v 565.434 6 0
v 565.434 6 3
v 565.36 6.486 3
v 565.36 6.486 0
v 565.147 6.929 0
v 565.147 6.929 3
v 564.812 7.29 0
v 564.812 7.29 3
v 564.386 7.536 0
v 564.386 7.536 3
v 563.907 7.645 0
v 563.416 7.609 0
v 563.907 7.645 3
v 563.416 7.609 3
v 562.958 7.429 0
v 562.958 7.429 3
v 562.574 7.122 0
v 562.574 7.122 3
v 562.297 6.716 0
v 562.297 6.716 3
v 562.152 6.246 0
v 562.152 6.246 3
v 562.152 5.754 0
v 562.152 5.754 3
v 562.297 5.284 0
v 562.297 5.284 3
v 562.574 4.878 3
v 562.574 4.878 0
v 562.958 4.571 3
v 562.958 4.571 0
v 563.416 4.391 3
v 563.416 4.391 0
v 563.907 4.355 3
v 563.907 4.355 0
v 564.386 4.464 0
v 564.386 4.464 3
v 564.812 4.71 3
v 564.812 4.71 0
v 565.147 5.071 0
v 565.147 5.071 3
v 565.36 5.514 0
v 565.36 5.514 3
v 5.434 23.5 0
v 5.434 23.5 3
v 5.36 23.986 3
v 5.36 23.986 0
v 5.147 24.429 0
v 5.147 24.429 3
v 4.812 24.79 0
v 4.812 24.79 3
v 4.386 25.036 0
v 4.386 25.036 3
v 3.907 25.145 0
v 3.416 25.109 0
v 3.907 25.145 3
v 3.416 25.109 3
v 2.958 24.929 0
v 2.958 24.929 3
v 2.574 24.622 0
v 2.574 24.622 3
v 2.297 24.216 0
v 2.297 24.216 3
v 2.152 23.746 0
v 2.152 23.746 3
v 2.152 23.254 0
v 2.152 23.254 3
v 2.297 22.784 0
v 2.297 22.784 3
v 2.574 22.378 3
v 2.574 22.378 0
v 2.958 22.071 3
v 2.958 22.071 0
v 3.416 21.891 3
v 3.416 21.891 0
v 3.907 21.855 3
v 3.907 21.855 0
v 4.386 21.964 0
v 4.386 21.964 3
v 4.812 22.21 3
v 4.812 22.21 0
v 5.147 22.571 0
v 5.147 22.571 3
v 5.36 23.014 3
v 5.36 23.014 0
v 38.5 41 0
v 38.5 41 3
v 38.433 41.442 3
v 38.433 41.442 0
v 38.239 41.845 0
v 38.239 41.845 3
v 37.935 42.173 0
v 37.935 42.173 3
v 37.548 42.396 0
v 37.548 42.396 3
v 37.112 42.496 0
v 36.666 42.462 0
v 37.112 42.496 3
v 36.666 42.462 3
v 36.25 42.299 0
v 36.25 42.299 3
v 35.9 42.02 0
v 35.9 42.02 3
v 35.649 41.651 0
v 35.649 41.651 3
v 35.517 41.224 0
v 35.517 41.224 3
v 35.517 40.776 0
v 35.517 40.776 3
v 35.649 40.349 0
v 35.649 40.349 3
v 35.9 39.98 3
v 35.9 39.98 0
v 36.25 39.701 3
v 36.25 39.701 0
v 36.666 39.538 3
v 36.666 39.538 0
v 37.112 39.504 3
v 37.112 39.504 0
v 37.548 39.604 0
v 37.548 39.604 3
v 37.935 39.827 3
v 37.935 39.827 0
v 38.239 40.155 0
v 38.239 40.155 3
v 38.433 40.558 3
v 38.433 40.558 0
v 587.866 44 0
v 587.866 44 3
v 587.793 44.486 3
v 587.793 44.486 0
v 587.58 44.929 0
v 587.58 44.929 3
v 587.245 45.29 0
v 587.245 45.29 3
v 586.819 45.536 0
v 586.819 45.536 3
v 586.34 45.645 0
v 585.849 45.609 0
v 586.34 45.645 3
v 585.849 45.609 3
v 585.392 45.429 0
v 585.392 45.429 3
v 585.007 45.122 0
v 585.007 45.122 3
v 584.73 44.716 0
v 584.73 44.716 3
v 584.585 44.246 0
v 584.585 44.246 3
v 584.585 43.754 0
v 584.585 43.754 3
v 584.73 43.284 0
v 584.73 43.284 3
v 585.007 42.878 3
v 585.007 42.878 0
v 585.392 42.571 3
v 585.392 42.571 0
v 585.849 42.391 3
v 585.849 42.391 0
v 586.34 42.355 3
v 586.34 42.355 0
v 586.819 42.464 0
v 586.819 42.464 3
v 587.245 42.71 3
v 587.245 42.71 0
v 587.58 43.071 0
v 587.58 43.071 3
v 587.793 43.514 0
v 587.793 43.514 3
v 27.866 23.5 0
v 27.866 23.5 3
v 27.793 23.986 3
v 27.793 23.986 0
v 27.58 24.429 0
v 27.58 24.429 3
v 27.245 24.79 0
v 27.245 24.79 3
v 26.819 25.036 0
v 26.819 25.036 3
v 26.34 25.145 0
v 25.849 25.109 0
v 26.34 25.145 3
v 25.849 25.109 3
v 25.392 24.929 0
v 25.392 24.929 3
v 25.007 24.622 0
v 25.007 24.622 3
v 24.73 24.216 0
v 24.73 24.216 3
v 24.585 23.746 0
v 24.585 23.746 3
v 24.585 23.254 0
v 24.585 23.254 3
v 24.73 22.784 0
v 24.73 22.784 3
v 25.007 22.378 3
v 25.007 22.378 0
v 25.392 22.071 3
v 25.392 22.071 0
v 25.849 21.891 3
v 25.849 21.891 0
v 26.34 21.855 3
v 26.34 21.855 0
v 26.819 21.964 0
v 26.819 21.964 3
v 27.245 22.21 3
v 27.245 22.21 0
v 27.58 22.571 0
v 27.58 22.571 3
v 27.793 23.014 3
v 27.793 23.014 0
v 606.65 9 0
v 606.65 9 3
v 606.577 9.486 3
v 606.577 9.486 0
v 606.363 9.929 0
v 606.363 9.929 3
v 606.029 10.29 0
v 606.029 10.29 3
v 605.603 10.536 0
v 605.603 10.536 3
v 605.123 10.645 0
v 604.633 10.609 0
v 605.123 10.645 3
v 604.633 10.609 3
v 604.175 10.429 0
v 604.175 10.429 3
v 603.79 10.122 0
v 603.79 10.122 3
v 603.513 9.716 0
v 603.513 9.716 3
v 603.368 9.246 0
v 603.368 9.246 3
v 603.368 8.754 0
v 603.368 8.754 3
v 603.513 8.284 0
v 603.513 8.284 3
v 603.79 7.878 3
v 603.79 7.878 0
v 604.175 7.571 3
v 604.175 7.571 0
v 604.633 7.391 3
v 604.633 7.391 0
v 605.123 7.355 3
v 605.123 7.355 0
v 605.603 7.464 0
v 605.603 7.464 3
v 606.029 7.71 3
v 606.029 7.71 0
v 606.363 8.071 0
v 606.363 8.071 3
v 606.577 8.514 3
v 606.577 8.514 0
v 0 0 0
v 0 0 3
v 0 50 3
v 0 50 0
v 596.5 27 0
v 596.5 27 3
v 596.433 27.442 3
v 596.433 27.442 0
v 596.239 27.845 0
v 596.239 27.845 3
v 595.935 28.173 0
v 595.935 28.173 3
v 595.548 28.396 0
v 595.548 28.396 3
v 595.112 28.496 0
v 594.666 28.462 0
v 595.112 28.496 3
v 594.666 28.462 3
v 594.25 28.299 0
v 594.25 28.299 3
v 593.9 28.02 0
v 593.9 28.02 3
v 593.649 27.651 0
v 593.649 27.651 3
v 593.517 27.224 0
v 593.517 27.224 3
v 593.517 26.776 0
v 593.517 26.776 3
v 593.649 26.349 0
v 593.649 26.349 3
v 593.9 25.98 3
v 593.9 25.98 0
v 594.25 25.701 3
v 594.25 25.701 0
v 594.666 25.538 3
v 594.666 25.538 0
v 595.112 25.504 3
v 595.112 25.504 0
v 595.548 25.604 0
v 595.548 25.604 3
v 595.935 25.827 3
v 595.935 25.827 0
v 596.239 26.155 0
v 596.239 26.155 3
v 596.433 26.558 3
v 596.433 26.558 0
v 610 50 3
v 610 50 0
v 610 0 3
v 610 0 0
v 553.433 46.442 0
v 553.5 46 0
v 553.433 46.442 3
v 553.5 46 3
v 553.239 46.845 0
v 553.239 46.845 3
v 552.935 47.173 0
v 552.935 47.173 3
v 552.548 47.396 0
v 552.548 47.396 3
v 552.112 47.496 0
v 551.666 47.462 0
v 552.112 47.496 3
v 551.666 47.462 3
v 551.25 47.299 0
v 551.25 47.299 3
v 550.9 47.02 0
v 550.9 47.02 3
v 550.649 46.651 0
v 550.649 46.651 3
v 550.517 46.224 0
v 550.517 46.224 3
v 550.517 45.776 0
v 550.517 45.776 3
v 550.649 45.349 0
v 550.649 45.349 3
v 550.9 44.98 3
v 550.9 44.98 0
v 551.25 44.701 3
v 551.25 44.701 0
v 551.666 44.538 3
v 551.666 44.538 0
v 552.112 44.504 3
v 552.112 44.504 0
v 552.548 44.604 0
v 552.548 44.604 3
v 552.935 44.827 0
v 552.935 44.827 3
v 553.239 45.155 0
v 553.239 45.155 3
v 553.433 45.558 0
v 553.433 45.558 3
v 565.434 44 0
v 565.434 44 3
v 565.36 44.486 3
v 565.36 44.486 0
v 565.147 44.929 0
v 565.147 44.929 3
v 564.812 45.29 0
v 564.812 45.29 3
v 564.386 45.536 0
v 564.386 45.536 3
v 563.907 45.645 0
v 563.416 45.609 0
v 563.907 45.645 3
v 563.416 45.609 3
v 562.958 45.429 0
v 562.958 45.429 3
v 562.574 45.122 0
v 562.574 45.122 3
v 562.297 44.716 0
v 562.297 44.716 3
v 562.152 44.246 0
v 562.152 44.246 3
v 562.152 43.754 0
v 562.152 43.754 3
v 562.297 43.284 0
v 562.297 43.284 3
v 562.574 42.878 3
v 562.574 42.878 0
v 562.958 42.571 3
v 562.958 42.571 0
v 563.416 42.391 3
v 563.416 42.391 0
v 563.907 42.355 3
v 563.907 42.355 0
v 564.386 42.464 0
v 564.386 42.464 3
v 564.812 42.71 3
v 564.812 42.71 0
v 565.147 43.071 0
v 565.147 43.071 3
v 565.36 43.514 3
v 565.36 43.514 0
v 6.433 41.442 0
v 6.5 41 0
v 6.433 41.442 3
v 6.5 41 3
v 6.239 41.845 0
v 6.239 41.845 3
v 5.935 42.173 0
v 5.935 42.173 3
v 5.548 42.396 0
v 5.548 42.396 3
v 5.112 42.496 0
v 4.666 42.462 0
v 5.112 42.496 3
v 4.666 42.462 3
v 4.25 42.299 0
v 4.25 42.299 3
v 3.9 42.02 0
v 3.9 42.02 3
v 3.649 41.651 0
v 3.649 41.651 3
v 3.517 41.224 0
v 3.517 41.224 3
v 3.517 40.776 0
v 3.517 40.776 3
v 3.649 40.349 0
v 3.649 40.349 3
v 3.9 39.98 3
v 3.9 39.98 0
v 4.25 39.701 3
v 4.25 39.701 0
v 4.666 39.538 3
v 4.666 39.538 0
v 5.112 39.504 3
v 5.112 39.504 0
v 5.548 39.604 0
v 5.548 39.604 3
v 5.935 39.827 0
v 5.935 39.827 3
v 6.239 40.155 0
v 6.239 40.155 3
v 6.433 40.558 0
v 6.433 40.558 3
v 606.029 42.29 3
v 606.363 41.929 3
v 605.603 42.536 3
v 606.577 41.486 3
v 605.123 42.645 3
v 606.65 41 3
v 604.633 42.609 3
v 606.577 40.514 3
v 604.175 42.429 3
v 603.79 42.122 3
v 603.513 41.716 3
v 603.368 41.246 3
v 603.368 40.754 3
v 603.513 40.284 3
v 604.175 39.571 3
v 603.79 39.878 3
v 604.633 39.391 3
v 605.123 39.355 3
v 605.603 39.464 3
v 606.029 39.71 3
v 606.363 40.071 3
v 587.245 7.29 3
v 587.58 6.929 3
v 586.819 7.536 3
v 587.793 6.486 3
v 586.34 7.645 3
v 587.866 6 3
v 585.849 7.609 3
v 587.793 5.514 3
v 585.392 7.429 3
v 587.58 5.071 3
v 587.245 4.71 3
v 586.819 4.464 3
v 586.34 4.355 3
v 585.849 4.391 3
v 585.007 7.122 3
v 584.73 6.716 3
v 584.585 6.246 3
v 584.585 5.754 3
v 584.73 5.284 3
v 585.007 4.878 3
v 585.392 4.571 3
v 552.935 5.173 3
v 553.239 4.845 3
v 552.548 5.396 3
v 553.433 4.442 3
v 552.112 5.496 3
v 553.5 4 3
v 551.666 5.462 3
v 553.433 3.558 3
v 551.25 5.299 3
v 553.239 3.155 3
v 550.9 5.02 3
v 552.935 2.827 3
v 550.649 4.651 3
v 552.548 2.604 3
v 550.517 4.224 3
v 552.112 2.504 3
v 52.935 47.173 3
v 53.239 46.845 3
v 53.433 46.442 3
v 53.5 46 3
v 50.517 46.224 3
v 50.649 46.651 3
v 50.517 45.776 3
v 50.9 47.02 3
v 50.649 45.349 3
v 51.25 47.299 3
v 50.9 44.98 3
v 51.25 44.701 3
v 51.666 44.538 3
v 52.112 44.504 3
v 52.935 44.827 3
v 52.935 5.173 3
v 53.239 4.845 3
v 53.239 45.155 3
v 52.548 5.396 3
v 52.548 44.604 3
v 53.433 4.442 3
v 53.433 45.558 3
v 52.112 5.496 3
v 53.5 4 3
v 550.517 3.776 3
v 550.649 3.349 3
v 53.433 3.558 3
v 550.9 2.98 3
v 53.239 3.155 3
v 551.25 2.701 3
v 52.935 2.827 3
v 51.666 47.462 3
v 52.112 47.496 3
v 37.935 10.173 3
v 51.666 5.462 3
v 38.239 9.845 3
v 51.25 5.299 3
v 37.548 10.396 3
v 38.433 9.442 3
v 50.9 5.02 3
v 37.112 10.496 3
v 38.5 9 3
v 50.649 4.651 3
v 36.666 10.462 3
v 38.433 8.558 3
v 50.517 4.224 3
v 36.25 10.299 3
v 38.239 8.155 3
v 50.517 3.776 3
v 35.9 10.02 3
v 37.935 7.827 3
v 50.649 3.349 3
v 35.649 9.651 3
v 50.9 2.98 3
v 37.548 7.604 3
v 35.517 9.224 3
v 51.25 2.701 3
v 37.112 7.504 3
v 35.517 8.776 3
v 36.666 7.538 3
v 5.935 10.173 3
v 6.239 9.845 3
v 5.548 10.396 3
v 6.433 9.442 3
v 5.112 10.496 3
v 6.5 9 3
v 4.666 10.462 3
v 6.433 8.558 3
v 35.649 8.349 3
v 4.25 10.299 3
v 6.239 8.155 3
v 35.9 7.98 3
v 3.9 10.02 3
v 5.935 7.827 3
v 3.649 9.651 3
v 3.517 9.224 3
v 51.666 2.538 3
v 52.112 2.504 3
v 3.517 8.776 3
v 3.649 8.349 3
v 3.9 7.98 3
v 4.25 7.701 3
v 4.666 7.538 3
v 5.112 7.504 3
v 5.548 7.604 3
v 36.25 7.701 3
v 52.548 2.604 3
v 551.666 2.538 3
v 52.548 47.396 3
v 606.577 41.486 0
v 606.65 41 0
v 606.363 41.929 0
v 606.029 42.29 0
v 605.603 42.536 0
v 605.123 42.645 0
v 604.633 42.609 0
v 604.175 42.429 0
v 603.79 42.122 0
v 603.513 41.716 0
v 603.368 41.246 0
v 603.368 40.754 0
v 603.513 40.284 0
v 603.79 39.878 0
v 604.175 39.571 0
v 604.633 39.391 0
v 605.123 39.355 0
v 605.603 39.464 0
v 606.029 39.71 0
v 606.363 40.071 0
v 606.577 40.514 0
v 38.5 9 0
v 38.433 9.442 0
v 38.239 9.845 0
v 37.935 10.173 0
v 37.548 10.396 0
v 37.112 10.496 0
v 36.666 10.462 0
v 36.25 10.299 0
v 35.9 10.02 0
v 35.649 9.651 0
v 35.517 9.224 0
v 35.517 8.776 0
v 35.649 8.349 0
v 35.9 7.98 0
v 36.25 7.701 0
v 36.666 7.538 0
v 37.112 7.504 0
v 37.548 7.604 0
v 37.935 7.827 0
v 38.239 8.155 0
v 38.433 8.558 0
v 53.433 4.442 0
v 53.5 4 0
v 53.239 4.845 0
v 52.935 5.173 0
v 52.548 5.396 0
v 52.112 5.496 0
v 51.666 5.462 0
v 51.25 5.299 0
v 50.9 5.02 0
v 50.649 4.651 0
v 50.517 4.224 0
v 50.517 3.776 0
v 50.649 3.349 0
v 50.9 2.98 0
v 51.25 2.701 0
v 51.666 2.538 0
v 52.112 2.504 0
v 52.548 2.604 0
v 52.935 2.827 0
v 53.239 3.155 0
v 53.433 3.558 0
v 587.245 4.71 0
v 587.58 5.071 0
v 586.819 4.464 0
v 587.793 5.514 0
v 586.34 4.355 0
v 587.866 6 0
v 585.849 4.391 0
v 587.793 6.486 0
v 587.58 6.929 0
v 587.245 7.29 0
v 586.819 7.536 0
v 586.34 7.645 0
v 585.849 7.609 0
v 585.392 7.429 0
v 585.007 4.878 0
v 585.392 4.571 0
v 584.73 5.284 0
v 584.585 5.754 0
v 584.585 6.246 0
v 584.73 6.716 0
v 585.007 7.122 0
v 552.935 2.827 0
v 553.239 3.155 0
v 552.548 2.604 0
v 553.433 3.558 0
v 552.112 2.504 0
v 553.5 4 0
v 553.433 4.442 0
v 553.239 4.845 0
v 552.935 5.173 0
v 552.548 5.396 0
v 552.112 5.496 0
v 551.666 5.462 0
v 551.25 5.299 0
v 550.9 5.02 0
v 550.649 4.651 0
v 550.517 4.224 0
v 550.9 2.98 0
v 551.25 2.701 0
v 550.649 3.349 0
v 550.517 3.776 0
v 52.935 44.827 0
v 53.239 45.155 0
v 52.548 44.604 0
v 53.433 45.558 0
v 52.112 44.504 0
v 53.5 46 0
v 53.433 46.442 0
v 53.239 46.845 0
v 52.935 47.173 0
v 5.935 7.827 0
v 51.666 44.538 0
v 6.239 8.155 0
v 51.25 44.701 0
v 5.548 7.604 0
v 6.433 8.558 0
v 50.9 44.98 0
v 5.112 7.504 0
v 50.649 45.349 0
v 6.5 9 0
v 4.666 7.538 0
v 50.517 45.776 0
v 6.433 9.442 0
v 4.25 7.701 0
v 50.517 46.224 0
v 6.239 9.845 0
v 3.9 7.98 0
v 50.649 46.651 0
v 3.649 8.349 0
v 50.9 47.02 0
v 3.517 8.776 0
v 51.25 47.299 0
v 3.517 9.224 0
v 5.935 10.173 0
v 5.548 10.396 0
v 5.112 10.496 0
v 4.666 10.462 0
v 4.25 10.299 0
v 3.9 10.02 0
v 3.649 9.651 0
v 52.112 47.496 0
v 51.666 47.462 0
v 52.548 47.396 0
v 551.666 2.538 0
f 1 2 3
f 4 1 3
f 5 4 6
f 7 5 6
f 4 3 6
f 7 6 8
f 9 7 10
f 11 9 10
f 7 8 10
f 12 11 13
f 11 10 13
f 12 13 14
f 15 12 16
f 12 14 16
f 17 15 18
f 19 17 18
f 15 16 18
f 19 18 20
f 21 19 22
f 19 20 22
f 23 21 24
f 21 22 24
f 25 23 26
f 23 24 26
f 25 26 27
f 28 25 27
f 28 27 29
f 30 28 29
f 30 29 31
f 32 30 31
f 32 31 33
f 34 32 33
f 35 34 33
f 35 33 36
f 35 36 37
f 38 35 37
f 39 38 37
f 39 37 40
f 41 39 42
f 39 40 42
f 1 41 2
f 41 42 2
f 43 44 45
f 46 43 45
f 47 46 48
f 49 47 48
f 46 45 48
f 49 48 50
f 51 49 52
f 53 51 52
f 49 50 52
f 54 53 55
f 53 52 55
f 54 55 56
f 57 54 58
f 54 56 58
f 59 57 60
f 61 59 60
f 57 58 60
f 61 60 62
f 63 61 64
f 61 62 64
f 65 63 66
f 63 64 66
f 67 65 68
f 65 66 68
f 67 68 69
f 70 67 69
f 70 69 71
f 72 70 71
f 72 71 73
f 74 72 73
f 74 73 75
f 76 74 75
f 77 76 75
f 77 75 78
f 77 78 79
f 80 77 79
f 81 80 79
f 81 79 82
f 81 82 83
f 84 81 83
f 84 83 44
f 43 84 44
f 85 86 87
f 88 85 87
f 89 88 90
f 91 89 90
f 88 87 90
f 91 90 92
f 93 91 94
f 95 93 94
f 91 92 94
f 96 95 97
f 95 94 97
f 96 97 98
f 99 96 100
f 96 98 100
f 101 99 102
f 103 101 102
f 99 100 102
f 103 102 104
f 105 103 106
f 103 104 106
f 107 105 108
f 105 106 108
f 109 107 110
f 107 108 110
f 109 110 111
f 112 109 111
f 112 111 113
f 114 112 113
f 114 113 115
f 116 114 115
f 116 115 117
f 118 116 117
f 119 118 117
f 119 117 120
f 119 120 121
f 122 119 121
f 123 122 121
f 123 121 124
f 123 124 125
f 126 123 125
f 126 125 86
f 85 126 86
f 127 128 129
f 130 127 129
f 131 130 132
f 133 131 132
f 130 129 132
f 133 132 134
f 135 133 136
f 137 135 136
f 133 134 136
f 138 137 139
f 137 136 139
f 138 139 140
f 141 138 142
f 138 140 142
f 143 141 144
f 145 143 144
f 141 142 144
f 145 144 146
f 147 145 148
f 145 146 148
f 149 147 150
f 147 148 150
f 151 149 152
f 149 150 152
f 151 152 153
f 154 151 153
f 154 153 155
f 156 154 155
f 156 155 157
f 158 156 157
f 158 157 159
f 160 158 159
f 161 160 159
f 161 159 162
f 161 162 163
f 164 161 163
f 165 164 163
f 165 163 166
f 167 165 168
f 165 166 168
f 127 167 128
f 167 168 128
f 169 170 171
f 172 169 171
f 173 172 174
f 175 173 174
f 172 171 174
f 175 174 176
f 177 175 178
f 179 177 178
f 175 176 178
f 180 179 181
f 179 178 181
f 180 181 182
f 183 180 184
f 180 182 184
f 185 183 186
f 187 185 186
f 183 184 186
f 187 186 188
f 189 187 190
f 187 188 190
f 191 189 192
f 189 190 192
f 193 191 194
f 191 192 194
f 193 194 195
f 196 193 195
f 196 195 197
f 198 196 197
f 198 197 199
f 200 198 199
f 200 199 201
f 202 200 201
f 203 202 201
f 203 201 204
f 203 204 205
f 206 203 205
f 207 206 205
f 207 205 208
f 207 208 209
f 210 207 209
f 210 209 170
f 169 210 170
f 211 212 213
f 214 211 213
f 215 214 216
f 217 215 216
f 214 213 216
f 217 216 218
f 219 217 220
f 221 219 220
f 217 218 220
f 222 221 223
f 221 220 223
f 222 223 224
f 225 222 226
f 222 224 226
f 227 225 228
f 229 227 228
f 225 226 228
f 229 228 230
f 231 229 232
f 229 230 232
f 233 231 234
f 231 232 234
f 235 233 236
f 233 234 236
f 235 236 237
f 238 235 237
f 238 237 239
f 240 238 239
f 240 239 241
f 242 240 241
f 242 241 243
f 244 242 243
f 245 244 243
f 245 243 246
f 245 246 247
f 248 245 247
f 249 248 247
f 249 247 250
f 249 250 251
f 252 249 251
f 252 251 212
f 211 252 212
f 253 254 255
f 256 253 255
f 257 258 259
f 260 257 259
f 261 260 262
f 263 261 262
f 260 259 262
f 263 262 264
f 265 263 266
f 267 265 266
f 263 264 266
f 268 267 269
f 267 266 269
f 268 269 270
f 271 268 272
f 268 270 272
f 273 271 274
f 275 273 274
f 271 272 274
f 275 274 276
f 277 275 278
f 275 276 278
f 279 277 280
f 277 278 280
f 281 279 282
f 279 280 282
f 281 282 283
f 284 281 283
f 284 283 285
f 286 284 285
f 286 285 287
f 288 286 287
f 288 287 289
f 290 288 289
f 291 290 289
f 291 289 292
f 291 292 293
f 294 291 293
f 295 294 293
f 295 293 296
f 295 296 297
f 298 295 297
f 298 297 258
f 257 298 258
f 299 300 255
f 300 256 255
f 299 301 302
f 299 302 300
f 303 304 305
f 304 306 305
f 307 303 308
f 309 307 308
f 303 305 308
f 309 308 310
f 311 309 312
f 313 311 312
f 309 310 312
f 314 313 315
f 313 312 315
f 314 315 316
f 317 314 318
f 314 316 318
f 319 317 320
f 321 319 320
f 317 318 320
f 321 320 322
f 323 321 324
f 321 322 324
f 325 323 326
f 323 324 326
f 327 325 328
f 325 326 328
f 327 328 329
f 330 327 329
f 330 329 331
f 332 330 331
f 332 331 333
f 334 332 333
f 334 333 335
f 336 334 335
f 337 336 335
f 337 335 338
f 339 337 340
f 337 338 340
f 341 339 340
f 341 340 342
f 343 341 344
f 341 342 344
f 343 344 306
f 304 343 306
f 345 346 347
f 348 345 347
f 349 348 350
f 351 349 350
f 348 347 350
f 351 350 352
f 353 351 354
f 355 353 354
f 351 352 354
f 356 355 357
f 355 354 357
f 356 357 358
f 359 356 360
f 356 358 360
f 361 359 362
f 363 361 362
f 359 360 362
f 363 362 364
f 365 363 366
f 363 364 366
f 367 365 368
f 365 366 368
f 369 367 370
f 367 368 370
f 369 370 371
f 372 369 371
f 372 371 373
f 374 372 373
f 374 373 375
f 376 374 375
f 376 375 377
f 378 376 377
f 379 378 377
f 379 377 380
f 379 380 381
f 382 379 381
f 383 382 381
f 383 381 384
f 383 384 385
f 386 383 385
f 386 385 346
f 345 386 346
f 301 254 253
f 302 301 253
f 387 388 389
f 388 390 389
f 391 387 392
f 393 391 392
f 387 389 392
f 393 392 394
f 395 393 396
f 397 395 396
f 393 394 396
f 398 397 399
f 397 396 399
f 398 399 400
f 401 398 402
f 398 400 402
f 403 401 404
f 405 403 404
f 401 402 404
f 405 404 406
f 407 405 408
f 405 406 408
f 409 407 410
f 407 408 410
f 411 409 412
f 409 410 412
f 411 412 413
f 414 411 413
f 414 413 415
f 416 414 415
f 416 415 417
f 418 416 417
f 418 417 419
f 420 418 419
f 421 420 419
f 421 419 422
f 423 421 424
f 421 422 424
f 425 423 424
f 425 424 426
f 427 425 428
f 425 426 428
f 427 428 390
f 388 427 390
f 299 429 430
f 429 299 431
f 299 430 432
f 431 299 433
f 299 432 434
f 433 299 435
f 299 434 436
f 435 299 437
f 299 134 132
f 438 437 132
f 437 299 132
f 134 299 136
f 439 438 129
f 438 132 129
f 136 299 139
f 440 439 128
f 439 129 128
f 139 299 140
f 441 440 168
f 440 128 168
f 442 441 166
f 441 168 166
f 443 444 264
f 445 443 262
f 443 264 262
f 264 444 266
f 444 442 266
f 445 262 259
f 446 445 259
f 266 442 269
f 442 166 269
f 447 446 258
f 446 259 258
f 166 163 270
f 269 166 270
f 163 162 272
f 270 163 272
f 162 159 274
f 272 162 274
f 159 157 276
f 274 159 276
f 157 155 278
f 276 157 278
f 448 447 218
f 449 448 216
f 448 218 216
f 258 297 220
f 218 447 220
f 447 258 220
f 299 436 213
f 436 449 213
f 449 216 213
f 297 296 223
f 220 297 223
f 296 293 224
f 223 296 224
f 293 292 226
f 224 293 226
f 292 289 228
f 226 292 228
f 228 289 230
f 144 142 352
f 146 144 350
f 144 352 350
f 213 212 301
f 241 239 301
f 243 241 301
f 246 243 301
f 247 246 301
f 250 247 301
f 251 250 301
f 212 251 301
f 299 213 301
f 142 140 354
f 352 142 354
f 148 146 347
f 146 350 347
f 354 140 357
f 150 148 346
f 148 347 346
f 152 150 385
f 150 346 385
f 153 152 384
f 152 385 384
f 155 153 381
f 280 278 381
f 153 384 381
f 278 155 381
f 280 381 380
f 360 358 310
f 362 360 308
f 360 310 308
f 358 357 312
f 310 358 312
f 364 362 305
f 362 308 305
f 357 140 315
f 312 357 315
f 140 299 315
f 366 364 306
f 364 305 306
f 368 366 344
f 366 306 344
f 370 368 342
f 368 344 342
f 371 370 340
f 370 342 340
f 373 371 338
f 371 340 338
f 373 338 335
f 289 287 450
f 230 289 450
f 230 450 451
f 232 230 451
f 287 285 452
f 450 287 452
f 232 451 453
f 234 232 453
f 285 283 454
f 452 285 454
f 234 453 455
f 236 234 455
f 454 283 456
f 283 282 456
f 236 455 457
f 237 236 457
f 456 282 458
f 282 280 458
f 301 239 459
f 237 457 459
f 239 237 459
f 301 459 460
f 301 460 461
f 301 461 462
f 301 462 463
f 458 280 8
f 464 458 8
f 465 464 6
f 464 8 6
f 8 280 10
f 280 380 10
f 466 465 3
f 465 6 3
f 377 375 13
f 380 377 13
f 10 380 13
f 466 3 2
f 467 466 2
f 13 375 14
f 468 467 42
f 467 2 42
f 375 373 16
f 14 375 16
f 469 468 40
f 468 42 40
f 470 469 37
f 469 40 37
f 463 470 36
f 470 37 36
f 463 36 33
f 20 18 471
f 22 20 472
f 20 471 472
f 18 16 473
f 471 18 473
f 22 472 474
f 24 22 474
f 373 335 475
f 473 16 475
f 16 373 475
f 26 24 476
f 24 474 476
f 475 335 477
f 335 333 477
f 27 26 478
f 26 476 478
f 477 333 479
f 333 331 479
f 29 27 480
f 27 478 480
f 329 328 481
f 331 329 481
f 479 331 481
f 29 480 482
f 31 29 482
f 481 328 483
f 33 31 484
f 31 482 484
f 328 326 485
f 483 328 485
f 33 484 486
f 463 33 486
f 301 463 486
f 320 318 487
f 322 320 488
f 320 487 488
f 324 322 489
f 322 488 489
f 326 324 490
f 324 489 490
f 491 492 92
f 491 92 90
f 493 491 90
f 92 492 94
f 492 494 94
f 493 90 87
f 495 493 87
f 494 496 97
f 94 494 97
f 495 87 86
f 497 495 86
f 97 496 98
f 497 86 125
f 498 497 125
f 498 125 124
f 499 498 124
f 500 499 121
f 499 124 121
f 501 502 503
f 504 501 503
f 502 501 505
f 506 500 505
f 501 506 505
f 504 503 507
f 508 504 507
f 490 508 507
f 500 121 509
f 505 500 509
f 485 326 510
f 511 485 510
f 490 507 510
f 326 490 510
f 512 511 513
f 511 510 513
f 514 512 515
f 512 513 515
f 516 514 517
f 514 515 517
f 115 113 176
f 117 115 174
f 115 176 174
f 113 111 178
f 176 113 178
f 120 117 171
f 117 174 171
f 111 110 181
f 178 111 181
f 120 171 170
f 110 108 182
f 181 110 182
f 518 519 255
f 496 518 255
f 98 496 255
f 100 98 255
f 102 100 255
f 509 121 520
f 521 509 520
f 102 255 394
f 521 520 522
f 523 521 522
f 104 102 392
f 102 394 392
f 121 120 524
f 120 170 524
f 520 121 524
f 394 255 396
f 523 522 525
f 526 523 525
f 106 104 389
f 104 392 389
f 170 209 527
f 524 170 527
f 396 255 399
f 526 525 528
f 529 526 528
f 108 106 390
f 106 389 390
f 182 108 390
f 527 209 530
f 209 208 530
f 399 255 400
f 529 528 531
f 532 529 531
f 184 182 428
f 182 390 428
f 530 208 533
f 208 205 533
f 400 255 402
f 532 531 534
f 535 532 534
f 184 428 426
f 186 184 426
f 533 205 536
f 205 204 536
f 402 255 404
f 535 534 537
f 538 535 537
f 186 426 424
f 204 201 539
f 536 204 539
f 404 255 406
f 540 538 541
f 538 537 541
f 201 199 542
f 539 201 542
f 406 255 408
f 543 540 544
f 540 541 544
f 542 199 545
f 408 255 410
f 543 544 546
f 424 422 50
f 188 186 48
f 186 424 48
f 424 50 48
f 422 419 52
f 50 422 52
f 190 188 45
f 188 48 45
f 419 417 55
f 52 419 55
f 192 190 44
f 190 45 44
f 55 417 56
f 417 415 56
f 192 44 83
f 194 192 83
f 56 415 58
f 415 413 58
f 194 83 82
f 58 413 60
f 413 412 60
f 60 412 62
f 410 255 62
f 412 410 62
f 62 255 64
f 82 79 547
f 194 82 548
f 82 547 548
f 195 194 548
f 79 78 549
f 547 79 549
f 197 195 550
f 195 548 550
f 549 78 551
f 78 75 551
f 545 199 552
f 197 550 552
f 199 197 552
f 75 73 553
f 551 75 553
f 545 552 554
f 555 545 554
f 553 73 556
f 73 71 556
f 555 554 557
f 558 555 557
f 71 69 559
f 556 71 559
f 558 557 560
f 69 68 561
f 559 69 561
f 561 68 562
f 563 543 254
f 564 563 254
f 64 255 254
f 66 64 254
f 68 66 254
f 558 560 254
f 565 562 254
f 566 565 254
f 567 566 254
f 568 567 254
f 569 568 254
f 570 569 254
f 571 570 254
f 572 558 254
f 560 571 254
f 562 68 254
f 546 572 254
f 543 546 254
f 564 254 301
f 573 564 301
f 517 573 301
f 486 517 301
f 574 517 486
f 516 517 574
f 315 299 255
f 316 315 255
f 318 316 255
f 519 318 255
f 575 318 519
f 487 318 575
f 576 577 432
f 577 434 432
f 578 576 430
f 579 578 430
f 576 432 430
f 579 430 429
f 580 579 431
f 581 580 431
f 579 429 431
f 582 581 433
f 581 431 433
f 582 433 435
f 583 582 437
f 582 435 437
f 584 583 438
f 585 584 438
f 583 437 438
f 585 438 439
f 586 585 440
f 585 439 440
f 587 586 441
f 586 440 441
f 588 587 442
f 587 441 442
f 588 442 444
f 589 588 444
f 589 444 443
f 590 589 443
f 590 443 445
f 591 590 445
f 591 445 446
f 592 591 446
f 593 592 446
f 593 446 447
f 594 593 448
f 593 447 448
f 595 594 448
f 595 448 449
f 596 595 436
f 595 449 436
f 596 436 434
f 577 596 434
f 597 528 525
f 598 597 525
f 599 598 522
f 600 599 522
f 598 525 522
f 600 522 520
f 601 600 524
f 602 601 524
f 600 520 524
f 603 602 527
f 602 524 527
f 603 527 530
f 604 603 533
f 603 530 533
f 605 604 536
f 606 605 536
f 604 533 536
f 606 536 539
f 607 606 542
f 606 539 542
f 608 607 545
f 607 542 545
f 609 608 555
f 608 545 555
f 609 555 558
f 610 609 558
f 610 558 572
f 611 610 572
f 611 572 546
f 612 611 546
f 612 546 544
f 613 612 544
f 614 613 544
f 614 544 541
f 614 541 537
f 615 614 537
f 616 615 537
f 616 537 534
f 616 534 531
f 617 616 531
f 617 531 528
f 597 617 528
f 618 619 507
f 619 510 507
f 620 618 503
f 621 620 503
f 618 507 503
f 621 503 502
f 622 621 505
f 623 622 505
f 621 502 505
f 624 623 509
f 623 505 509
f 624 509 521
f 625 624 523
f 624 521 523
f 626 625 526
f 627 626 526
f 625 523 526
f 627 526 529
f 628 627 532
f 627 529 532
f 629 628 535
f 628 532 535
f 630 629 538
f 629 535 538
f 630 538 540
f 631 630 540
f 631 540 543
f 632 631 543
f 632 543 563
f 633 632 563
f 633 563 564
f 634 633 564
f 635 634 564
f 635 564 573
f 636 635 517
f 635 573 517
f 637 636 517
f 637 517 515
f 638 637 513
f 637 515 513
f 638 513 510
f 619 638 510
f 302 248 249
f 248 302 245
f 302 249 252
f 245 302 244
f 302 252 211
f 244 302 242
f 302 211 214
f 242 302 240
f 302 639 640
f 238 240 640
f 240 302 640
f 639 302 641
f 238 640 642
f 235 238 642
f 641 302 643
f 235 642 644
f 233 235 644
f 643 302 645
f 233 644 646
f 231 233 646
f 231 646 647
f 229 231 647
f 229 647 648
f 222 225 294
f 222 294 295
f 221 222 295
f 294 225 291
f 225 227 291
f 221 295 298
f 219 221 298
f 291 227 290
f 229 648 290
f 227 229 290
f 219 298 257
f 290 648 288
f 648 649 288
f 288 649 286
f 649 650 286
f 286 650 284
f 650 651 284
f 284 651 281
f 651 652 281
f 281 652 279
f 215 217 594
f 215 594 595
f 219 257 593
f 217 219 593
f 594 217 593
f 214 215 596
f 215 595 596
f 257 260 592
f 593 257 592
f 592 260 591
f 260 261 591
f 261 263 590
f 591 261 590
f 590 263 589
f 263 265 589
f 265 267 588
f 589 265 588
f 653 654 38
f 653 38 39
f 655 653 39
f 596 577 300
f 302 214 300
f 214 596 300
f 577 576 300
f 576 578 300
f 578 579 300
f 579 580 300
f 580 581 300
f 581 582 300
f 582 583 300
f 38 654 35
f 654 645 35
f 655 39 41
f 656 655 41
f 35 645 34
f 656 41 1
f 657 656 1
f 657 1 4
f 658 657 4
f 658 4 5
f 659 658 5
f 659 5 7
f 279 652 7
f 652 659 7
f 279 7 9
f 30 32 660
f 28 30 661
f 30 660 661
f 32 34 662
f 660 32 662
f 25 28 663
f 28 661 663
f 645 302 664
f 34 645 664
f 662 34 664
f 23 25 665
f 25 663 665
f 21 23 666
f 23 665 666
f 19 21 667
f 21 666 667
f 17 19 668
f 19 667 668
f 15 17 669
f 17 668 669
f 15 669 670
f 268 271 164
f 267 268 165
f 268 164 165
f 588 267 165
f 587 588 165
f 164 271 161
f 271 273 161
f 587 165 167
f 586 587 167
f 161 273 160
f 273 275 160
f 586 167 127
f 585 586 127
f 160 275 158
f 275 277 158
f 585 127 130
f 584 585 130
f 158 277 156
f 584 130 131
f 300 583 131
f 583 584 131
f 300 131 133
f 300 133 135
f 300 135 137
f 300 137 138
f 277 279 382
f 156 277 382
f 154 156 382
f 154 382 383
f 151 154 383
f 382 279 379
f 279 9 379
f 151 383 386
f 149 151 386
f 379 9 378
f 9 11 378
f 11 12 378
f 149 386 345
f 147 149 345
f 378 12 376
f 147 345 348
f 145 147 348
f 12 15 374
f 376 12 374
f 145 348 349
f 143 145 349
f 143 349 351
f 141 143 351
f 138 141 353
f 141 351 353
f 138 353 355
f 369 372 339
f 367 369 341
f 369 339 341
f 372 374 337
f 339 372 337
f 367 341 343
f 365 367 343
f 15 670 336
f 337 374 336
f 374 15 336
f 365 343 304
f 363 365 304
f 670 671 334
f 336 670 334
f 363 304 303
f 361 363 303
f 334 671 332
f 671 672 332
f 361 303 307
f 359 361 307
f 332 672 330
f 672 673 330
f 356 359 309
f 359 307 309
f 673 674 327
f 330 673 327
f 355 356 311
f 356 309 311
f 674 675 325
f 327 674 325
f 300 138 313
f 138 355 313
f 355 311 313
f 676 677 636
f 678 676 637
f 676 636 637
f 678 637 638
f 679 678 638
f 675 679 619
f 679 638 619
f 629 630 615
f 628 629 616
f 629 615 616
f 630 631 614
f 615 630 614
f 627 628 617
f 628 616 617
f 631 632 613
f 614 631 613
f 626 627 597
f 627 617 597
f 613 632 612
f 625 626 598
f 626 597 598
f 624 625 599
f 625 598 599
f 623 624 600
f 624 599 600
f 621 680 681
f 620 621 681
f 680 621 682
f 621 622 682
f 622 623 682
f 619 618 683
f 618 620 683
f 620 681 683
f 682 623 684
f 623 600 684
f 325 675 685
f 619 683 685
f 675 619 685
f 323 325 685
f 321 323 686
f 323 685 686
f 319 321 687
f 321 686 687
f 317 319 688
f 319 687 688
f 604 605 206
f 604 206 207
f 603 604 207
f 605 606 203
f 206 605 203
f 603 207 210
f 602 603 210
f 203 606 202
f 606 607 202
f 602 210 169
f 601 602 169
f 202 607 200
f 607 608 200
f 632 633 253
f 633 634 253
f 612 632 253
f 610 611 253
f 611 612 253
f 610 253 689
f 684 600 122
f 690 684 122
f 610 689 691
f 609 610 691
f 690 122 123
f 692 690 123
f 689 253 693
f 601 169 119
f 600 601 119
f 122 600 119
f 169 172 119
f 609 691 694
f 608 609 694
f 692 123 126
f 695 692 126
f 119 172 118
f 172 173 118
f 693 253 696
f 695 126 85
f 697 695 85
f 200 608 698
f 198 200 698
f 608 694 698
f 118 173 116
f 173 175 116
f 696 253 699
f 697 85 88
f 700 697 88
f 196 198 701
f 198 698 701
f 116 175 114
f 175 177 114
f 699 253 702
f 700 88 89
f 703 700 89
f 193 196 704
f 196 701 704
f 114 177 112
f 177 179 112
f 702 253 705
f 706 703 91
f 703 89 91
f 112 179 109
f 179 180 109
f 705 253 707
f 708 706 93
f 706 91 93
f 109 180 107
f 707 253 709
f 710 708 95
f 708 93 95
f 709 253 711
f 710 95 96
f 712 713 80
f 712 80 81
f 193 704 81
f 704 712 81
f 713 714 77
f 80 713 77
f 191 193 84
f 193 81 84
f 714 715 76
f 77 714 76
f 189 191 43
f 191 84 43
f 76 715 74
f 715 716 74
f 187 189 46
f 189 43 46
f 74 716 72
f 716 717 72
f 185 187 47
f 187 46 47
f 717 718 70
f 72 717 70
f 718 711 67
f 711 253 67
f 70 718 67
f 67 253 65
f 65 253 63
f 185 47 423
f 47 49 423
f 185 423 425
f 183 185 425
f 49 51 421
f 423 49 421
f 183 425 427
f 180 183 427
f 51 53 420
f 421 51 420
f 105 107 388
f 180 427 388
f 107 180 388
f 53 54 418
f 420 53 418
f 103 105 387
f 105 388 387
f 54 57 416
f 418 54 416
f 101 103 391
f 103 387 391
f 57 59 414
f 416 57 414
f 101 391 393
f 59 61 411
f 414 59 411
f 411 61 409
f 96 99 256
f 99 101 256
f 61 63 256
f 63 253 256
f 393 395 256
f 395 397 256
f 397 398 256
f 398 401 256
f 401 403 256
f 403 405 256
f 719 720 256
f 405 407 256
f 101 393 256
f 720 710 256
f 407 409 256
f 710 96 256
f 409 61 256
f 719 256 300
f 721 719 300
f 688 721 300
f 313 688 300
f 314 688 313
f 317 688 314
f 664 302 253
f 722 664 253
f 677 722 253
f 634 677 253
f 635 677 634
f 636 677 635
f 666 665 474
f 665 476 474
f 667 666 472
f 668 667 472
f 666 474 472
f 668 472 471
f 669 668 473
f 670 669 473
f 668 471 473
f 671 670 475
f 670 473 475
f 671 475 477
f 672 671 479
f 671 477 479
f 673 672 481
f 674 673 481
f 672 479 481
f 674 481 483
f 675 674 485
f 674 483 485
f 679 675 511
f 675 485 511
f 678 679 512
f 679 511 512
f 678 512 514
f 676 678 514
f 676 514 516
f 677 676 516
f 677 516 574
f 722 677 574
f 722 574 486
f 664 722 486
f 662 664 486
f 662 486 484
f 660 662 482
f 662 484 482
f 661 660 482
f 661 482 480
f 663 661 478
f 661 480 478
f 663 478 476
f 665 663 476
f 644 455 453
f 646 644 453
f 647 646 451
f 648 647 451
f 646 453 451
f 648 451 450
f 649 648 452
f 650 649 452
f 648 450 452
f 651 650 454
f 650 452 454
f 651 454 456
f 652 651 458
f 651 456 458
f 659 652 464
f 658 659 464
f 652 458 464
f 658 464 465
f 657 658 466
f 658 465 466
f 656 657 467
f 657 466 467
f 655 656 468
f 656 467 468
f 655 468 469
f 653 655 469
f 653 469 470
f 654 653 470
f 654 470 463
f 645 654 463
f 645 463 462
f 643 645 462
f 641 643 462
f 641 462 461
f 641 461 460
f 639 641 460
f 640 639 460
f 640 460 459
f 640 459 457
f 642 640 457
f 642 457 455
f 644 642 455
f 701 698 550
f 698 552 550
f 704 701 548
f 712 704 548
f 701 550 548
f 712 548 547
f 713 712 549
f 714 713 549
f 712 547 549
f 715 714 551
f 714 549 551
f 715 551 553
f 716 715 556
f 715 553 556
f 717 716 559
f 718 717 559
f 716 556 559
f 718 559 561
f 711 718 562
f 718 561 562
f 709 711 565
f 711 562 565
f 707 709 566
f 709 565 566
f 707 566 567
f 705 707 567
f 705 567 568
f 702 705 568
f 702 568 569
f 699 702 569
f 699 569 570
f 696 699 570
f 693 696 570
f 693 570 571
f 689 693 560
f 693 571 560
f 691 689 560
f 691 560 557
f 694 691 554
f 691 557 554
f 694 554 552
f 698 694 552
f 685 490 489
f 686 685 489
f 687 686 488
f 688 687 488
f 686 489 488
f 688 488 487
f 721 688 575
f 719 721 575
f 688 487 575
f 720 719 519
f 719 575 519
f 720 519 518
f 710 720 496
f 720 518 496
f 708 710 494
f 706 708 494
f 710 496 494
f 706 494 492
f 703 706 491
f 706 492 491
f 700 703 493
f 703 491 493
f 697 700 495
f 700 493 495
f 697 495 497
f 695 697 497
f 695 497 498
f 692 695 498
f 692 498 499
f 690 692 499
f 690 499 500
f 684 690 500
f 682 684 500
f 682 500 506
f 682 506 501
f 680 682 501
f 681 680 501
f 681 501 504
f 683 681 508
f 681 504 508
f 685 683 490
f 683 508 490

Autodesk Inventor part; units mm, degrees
ref_plane "YZ Plane" through (0, 0, 0) normal (1, 0, 0) x (0, 1, 0)
ref_plane "XZ Plane" through (0, 0, 0) normal (0, 1, 0) x (-1, 0, 0)
ref_plane "XY Plane" through (0, 0, 0) normal (0, 0, 1) x (1, 0, 0)
sketch "Sketch1" plane through (0, 0, 0) normal (1, 0, 0) x (0, 1, 0)
  line L0 (0, 0) -> (50, 0)
  line L1 (50, 0) -> (50, 3)
  line L2 (50, 3) -> (0, 3)
  line L3 (0, 3) -> (0, 0)
  dimension "d0" = 50
  dimension "d1" = 3
extrude "Extrusion1" add sketch "Sketch1" along normal blind 610
sketch "Sketch2" plane through (0, 0, 3) normal (0, 0, 1) x (1, 0, 0)
  line L0 (0, 0) -> (610, 0) projected
  line L1 (0, 50) -> (610, 50) projected
  line L2 (0, 50) -> (0, 0) projected
  line L3 (610, 50) -> (610, 0) projected
  line L4 (5, 9) -> (37, 9) construction
  line L5 (37, 9) -> (37, 41) construction
  line L6 (37, 41) -> (5, 41) construction
  line L7 (5, 41) -> (5, 9) construction
  circle A0 centre (5, 41) radius 1.5
  circle A1 centre (37, 41) radius 1.5
  circle A2 centre (37, 9) radius 1.5
  circle A3 centre (5, 9) radius 1.5
  circle A4 centre (595, 27) radius 1.5
  circle A5 centre (563.7835, 44) radius 1.65 projected
  circle A6 centre (586.2165, 44) radius 1.65 projected
  circle A7 centre (586.2165, 6) radius 1.65 projected
  circle A8 centre (563.7835, 6) radius 1.65 projected
  circle A9 centre (552, 4) radius 1.5 projected
  circle A10 centre (552, 46) radius 1.5 projected
  circle A11 centre (605, 41) radius 1.65 projected
  circle A12 centre (605, 9) radius 1.65 projected
  circle A13 centre (52, 46) radius 1.5 projected
  circle A14 centre (52, 4) radius 1.5 projected
  circle A15 centre (26.2165, 23.5) radius 1.65 projected
  circle A16 centre (3.7835, 23.5) radius 1.65 projected
  point P0 (608, 14)
  point P1 (5, 25)
  point P2 (0, 25)
  point P3 (610, 25)
  dimension "d12" = 32
  dimension "d13" = 32
  dimension "d14" = 5
  dimension "d15" = 3
  dimension "d16" = 3
  dimension "d17" = 3
  dimension "d18" = 3
  dimension "d26" = 3
  dimension "d27" = 15
  dimension "d35" = 27
extrude "Extrusion2" cut sketch "Sketch2" against normal blind 10 contours A0 | A1 | A2 | A3 | A4 | A5 | A6 | A7 | A8 | A9 | A10 | A11 | A12 | A13 | A14 | A15 | A16
properties part number "X Rail"
